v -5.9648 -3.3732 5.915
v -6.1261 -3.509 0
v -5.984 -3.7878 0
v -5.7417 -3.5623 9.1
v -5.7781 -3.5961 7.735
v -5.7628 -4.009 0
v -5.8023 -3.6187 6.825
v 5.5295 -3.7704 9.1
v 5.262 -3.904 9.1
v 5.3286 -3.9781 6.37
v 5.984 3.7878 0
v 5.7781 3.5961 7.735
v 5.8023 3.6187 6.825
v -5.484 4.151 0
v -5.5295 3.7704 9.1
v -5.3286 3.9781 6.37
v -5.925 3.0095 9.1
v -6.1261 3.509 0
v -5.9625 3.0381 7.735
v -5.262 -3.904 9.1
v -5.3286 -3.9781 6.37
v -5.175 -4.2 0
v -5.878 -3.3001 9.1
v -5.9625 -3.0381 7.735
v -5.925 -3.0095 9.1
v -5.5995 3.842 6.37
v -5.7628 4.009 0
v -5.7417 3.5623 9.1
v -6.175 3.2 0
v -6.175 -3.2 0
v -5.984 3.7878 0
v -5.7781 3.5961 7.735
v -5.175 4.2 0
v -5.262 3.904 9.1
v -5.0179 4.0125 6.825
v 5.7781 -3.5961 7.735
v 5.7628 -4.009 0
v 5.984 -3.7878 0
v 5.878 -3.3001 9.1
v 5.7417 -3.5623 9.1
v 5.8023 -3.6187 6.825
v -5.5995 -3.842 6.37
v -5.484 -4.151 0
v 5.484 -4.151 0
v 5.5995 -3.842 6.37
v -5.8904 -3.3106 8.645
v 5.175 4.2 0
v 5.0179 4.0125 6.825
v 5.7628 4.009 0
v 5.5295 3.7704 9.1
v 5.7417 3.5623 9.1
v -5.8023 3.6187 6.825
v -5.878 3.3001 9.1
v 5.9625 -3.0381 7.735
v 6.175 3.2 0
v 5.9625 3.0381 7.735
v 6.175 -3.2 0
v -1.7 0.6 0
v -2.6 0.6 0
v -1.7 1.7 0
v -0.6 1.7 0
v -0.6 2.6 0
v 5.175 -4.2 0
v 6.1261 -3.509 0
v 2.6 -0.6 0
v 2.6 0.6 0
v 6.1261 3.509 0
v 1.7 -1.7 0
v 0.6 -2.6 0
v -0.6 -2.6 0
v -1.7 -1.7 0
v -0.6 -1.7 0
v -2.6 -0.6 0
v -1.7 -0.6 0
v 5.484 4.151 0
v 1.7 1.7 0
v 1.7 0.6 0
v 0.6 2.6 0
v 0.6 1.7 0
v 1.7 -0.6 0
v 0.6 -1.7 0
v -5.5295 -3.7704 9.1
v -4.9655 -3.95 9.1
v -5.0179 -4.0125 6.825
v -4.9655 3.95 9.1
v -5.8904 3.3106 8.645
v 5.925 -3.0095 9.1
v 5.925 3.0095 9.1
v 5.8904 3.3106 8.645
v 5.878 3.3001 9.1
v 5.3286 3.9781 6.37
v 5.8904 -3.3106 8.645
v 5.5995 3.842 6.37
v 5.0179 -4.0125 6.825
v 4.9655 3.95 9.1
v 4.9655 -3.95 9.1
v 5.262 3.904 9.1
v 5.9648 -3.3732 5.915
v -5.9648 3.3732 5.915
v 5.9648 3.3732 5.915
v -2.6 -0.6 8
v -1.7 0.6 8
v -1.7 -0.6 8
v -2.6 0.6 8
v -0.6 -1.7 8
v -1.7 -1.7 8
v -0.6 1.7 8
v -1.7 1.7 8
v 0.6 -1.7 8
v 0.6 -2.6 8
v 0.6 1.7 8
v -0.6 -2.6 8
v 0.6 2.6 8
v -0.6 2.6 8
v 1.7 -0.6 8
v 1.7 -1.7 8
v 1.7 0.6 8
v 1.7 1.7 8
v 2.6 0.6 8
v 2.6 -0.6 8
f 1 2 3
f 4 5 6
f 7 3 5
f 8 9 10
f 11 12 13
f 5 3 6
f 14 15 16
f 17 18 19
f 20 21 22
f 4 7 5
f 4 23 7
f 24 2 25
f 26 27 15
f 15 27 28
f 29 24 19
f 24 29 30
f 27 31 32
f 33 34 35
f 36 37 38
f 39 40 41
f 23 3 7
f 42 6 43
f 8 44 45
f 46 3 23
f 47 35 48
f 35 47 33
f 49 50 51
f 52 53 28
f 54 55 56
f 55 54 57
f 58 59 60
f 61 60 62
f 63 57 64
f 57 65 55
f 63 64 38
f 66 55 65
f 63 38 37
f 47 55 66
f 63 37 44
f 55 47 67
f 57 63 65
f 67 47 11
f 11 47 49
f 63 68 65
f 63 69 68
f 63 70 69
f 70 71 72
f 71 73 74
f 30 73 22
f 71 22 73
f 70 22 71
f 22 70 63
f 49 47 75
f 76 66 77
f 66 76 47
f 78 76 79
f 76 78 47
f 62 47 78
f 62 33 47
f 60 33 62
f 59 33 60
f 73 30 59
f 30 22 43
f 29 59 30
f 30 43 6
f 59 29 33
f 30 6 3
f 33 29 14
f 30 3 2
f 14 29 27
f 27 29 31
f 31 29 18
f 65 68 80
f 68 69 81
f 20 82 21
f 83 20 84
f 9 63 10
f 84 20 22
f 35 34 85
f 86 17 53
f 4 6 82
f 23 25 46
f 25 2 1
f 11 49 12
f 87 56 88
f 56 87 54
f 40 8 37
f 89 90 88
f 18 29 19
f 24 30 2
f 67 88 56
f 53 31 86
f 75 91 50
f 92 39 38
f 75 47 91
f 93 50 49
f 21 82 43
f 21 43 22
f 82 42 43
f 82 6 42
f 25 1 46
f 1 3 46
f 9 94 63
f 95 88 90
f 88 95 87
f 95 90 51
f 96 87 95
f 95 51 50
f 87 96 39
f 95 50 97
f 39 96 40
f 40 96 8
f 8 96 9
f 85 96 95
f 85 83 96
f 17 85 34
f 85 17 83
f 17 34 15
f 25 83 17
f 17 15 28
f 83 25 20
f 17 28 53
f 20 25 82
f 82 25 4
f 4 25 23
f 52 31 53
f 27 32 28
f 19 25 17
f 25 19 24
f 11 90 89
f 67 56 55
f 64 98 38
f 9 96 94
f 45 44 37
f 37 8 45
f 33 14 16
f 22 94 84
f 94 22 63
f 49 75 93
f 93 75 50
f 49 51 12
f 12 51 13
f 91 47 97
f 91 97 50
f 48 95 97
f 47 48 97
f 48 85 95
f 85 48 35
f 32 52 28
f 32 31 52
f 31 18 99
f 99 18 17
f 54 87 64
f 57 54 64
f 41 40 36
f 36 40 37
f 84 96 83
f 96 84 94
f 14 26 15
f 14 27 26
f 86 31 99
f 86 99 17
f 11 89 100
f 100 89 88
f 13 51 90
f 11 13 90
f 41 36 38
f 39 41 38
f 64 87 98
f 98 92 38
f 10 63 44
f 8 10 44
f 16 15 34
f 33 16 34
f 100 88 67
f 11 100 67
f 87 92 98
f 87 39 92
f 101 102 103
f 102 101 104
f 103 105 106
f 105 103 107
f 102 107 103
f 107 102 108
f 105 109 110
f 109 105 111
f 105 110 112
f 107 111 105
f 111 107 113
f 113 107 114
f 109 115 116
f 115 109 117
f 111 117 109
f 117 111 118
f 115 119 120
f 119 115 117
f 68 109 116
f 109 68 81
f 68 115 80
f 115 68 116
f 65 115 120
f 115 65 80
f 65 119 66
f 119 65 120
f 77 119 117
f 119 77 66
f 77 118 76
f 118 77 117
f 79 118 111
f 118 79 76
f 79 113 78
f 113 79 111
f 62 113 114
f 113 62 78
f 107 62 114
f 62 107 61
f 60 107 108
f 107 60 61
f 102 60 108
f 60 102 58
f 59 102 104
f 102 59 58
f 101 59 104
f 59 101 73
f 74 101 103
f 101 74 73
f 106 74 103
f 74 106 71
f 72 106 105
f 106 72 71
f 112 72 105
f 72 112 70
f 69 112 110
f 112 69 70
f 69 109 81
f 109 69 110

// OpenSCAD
ovDims=[12.35,8.4,9.1];
faceDims=[11.85,7.9];
crnRad=1;
//hole
crossDims=[5,1];
sqDim=3.2;
deep=8;
fudge=0.1;
spcng=0.1;

$fn=20;
sqSpcng=[spcng*2,spcng*2];

difference(){
  linear_extrude(ovDims.z,scale=[faceDims.x/ovDims.x,faceDims.y/ovDims.y])
    hull() for (ix=[-1,1],iy=[-1,1])
      translate([ix*(ovDims.x/2-crnRad),iy*(ovDims.y/2-crnRad)]) circle(crnRad);
  translate([0,0,-fudge]) linear_extrude(deep+fudge){
    square(sqDim+spcng*2,true);
    square(crossDims+sqSpcng,true);
    rotate(90) square(crossDims+sqSpcng,true);
  }
}
